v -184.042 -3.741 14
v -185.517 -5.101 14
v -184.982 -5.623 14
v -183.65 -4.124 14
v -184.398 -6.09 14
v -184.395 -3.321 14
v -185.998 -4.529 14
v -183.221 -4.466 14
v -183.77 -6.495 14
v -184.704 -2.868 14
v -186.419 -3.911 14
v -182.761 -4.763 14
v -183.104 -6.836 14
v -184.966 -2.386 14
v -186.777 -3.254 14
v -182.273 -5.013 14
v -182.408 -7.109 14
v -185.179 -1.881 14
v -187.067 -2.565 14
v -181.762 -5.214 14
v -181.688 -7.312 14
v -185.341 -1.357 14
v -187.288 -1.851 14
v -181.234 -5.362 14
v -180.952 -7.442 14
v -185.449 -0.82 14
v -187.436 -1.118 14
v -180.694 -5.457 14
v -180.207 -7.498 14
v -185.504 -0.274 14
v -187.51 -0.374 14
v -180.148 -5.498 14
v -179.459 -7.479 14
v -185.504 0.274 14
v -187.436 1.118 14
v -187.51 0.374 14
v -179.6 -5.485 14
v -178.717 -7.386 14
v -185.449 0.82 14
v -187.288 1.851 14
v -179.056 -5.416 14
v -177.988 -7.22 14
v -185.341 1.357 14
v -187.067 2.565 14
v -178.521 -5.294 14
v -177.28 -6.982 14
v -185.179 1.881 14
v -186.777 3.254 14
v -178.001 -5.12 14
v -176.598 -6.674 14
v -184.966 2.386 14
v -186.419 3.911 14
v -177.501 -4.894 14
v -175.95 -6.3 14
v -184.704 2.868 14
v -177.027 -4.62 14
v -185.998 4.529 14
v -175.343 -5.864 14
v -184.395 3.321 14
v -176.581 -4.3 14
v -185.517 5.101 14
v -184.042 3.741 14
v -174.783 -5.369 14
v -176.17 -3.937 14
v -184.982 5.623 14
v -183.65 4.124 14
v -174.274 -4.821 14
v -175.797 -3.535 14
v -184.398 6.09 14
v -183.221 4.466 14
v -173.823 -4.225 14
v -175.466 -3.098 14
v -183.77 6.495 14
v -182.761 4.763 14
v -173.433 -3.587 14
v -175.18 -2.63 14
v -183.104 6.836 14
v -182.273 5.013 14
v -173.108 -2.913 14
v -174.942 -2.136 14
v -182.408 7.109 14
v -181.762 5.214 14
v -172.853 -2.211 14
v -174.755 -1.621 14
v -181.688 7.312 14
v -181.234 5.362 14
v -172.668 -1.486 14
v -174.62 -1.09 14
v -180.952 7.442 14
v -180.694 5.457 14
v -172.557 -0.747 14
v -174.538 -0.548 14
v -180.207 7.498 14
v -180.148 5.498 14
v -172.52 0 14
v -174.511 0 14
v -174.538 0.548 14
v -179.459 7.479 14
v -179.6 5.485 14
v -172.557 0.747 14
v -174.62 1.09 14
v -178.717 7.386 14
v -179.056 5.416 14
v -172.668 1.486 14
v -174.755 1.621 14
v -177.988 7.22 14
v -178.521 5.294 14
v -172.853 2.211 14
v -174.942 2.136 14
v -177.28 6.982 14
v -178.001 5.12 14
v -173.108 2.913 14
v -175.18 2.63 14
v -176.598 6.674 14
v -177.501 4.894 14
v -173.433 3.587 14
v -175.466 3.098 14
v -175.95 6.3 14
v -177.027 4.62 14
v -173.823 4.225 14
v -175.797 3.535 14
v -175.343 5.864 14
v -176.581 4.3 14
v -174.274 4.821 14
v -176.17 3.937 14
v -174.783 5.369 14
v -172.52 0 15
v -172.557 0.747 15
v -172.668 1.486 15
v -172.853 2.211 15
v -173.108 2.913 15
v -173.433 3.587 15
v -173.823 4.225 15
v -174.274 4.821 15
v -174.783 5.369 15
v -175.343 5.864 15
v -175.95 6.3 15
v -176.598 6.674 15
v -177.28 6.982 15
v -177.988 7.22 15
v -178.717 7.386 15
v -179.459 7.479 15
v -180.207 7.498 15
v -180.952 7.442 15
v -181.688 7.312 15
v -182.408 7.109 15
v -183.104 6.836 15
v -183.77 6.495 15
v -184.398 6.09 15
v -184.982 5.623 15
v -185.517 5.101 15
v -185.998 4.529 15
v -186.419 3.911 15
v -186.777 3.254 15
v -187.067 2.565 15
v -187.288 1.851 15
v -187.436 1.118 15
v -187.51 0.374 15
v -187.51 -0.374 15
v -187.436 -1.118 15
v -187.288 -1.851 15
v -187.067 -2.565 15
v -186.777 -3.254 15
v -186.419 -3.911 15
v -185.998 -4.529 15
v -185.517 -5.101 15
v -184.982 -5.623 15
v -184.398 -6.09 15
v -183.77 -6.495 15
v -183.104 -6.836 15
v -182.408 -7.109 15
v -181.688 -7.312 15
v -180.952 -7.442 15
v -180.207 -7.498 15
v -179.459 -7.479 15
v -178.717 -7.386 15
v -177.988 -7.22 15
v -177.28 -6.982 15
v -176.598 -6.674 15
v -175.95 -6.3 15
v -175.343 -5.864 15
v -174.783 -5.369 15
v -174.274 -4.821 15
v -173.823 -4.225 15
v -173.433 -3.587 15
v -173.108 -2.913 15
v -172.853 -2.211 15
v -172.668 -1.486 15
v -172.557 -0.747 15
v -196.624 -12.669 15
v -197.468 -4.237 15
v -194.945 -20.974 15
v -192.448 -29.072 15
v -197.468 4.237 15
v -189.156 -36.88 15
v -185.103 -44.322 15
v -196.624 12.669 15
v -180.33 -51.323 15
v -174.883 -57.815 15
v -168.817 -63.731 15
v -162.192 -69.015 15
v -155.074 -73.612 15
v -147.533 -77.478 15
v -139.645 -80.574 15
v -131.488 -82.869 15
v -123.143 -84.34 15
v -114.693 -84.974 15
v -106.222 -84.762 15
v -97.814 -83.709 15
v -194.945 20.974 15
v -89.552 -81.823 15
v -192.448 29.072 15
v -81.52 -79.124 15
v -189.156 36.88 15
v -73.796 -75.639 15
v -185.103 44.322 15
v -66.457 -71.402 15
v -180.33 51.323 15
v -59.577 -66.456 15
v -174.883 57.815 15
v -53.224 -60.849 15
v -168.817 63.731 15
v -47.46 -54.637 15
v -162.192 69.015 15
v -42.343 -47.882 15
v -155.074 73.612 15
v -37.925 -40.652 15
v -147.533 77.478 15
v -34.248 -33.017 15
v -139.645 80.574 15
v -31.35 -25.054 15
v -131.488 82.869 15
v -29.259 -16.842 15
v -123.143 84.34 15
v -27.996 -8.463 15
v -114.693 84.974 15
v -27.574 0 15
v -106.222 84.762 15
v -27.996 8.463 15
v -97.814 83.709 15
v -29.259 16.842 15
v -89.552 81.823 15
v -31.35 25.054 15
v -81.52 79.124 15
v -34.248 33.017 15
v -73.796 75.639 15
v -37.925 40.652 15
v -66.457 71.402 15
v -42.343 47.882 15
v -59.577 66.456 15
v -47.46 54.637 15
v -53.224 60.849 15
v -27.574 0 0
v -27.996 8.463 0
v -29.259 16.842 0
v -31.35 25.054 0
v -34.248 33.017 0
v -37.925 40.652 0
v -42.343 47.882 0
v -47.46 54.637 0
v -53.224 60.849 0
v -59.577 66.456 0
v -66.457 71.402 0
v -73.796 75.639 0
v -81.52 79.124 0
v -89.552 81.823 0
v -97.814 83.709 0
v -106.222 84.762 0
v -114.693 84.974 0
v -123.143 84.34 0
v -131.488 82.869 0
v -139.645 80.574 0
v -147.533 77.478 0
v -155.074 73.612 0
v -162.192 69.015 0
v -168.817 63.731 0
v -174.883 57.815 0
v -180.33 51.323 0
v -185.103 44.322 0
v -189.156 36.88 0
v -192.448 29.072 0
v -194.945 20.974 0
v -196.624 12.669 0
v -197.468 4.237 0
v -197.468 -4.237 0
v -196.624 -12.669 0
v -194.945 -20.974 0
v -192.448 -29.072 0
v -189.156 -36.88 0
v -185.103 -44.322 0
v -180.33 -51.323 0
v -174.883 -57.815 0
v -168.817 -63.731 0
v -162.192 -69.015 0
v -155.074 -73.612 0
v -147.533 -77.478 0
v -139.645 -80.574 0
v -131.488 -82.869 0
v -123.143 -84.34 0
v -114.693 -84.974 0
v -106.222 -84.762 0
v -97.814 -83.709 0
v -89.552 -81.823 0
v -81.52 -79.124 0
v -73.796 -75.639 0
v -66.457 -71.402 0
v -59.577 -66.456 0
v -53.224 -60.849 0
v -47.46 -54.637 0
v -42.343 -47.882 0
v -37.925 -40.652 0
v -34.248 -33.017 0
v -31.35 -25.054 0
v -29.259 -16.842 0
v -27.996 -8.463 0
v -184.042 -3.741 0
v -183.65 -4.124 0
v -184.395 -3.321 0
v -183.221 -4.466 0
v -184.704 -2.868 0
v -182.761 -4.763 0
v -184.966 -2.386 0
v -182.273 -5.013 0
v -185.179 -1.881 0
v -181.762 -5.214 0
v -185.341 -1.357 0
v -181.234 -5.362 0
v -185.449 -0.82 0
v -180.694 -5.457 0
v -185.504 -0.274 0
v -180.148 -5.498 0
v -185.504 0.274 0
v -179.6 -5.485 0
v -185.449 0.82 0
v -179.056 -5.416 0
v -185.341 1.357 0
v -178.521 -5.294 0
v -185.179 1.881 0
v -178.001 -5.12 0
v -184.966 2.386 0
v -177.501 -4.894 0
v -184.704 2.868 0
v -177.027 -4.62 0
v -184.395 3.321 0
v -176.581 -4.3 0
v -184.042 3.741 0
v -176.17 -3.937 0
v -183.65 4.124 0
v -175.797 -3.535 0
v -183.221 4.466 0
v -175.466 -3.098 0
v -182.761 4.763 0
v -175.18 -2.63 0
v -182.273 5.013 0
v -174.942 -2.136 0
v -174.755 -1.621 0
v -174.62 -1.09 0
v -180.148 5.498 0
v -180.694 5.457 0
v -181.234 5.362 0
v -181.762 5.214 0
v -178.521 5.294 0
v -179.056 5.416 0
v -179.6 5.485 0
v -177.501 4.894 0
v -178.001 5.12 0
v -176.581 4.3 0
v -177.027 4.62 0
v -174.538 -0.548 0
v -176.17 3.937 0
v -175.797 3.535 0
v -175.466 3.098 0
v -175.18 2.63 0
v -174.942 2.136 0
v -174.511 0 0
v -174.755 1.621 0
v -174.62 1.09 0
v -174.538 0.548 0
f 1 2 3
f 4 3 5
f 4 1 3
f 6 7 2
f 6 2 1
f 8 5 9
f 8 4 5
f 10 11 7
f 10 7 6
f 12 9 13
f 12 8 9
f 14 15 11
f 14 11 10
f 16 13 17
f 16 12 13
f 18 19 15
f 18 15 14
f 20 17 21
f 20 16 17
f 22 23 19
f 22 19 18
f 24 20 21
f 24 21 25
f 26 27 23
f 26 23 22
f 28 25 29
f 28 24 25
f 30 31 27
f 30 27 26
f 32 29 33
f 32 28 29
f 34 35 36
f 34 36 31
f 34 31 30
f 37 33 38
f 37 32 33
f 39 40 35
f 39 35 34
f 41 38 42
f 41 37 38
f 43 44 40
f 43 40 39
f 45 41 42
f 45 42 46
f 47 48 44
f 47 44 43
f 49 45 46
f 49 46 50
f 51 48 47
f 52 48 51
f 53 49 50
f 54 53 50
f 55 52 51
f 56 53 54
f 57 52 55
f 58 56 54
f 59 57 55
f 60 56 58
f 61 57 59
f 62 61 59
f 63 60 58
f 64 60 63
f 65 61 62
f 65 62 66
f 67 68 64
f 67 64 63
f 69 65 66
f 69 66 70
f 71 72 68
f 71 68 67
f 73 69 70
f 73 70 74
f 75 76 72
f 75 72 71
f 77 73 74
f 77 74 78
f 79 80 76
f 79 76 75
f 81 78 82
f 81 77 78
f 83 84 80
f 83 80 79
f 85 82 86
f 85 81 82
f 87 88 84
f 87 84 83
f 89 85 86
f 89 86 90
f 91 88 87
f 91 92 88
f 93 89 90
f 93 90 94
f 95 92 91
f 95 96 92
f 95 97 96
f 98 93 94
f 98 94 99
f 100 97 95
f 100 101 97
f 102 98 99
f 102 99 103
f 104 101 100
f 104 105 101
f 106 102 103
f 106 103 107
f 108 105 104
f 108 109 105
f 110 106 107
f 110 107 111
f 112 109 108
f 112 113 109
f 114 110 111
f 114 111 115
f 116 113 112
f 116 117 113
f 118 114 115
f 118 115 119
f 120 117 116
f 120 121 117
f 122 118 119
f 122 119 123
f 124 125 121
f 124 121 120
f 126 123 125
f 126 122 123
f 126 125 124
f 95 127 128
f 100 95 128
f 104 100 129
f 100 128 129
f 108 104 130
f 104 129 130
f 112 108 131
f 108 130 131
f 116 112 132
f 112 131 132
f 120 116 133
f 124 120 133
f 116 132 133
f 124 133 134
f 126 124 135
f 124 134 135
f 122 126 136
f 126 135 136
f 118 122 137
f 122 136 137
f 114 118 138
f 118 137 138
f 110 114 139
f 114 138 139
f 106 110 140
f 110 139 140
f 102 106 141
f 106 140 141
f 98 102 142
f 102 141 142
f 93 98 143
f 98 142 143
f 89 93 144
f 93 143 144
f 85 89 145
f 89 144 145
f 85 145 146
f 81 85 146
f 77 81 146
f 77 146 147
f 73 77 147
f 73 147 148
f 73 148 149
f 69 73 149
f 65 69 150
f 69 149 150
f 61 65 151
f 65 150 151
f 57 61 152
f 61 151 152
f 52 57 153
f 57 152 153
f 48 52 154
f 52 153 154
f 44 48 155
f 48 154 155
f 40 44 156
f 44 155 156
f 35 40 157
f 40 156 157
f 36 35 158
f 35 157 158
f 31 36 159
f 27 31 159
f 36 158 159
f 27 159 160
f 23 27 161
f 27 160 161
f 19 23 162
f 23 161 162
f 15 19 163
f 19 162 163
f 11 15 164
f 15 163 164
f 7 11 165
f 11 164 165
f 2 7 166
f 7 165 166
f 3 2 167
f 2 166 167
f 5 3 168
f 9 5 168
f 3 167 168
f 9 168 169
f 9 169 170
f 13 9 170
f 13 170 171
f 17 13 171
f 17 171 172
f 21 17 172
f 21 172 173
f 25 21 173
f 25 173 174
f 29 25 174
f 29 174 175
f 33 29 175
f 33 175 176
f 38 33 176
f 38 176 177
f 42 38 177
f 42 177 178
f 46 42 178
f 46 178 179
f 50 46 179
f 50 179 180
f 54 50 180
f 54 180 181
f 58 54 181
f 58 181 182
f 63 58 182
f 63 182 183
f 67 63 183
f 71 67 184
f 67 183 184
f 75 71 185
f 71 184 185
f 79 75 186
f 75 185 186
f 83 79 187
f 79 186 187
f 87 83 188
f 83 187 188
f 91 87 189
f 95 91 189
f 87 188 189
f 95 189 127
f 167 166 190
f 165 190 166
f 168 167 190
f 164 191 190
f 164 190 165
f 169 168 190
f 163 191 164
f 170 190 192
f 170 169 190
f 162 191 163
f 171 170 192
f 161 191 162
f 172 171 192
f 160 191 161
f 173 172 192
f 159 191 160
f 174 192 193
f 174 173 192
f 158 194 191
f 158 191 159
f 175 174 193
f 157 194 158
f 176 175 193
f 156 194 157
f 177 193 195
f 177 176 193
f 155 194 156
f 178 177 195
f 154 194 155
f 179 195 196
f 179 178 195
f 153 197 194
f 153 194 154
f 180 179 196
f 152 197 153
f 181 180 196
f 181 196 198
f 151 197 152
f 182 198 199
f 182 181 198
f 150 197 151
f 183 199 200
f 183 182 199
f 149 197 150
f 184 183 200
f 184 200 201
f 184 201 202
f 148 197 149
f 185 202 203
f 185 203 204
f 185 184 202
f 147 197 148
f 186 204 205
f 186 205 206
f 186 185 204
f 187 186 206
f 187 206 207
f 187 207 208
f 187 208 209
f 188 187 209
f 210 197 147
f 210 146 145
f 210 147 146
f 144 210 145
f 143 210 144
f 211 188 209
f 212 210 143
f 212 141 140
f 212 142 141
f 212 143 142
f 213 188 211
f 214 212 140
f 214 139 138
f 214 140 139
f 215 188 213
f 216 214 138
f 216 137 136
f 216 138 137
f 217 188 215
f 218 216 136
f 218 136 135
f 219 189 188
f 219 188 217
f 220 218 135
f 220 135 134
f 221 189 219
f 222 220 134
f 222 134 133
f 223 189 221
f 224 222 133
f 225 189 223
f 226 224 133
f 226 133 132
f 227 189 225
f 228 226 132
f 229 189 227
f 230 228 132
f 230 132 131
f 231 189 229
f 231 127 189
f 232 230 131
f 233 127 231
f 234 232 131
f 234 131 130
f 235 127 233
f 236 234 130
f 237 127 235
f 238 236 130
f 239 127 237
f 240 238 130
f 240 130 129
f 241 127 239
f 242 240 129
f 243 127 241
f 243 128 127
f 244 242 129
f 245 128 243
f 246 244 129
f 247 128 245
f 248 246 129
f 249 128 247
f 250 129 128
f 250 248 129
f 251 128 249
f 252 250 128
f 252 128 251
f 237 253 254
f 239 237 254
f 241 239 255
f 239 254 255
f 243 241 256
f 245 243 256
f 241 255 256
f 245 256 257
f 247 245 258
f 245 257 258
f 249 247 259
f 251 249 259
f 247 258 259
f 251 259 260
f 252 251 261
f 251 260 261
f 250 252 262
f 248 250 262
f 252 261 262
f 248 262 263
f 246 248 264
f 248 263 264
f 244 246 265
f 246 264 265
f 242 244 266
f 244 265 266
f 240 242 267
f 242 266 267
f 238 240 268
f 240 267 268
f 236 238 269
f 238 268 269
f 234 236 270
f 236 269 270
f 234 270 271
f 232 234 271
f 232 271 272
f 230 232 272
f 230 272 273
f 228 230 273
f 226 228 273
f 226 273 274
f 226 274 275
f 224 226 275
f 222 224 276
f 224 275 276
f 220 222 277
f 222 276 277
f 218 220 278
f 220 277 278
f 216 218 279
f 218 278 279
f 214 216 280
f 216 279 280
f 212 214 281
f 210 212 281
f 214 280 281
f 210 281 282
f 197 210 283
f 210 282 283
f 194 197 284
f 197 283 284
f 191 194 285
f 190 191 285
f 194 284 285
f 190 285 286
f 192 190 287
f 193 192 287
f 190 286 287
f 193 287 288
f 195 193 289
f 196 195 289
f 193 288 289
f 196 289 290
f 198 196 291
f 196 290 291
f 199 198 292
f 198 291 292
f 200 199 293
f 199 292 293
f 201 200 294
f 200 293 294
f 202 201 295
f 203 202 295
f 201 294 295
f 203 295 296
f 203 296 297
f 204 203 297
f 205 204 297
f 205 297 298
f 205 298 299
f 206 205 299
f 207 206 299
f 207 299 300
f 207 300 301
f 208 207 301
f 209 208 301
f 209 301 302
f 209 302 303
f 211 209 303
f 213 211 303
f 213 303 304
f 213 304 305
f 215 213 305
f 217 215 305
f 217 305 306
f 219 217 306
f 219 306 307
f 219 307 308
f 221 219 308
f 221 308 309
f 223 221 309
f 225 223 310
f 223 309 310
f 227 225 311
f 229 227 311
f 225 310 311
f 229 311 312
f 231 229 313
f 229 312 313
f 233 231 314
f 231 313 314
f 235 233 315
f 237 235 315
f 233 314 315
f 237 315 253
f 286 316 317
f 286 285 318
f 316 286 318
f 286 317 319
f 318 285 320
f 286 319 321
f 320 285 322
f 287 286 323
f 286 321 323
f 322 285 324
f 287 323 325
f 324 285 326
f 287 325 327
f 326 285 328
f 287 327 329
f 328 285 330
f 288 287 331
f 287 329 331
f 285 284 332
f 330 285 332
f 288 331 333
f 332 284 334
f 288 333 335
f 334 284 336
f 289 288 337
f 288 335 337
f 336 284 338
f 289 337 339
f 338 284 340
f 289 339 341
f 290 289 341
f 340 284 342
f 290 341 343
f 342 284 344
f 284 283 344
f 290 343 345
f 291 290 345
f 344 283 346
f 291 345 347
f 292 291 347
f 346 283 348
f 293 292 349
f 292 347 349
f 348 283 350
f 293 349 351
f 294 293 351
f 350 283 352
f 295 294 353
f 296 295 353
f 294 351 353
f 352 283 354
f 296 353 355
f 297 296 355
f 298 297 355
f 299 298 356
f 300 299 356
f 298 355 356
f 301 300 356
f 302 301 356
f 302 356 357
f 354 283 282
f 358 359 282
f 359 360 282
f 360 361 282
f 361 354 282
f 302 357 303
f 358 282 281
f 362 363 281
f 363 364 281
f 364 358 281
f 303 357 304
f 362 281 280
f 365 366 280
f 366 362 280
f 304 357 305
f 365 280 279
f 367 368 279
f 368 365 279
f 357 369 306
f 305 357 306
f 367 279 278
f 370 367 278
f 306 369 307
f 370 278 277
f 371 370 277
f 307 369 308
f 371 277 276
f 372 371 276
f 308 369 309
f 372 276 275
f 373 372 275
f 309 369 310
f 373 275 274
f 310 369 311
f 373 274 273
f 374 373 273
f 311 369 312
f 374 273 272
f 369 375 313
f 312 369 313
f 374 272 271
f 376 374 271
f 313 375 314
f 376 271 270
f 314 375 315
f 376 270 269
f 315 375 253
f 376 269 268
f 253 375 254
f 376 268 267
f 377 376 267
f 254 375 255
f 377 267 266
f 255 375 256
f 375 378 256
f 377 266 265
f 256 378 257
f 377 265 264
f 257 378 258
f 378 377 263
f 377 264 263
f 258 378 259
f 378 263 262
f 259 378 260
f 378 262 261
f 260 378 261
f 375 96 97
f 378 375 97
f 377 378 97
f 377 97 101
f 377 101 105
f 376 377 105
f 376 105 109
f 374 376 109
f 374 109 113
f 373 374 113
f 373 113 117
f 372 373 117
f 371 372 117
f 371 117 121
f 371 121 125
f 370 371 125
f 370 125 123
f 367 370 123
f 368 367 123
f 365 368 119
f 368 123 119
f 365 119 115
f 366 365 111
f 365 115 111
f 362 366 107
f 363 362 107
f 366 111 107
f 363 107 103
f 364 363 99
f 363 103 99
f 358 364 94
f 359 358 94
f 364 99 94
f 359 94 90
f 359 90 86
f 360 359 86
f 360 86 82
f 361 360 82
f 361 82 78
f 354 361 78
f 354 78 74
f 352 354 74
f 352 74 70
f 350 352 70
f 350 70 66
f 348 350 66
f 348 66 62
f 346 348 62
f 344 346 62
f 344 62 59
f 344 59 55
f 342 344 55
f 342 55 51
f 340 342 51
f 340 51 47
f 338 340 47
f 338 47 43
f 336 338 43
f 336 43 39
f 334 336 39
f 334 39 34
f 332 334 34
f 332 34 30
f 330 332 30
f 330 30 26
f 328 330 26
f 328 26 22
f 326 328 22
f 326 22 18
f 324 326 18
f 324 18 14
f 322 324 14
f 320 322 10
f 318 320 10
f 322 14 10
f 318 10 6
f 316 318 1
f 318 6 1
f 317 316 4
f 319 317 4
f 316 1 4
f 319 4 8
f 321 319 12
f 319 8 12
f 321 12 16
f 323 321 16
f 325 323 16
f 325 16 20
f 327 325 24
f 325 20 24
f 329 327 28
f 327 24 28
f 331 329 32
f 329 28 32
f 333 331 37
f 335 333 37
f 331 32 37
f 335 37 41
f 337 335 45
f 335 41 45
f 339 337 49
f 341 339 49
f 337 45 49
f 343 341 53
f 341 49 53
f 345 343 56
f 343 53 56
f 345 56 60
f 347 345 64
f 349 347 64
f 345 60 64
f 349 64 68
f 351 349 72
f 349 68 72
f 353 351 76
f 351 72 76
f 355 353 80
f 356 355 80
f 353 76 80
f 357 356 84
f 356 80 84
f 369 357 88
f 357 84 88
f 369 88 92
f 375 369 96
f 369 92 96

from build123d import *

# Parameters (mm, degrees)
ESQUISSE1_R             = 85
BOSS_EXTRU_1_DEPTH      = 15
ESQUISSE2_R             = 7.5
ENL_V_MAT_EXTRU_1_DEPTH = 1
ESQUISSE4_R             = 5.5
ENL_V_MAT_EXTRU_2_DEPTH = 15


with BuildPart() as part:
    # Esquisse1 → Boss.-Extru.1 (new body)
    with BuildSketch(Plane.XY):
        with Locations((-112.573673301, 0)):
            Circle(ESQUISSE1_R)
    extrude(amount=BOSS_EXTRU_1_DEPTH)

    # Esquisse2 → Enlèv. mat.-Extru.1 (cut)
    with BuildSketch(Plane.XY.offset(15)):
        with Locations((-180.019561977, 0)):
            Circle(ESQUISSE2_R)
    extrude(amount=-ENL_V_MAT_EXTRU_1_DEPTH, mode=Mode.SUBTRACT)

    # Esquisse4 → Enlèv. mat.-Extru.2 (cut)
    with BuildSketch(Plane.XY.offset(14)):
        with Locations((-180.010590856, 0)):
            Circle(ESQUISSE4_R)
    extrude(amount=-ENL_V_MAT_EXTRU_2_DEPTH, mode=Mode.SUBTRACT)


solid = part.part
